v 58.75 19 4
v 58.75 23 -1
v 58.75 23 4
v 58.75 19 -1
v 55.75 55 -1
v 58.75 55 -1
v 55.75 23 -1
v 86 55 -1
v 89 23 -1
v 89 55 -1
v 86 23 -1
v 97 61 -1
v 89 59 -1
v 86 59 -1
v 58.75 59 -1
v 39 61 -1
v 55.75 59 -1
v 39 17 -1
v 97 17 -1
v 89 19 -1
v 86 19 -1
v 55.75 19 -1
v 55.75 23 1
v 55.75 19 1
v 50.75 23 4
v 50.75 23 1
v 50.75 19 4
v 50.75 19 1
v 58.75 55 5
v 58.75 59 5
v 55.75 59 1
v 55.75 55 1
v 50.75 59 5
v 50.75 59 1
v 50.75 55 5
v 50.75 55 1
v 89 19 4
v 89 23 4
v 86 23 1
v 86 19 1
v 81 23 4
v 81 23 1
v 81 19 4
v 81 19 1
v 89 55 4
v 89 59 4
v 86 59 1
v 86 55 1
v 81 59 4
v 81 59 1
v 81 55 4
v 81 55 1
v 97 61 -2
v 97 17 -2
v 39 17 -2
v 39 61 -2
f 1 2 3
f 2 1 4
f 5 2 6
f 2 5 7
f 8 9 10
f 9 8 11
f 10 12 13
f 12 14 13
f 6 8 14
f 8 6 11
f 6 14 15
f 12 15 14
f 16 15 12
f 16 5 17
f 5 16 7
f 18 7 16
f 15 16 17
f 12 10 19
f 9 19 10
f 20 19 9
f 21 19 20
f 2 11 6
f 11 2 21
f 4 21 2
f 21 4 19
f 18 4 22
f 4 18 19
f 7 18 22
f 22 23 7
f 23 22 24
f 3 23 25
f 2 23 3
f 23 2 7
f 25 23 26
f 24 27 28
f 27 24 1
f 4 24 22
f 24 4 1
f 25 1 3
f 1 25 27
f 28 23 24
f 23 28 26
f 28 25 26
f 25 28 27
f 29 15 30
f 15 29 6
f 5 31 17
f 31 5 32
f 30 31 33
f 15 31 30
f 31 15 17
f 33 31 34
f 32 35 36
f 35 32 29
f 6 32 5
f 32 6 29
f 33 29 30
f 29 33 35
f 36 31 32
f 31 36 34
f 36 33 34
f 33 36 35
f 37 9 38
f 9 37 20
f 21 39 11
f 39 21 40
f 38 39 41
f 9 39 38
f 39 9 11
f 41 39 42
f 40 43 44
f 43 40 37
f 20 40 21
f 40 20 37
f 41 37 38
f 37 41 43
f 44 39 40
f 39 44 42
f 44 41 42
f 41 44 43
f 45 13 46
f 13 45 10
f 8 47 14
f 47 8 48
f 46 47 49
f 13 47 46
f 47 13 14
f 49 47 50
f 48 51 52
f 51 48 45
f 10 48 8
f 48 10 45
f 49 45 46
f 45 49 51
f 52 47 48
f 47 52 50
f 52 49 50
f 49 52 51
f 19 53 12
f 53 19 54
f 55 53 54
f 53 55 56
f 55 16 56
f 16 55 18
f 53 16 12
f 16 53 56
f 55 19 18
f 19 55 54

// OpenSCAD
// kame outer parameters
kamebox_length=102;
kamebox_width=77;
kamebox_servobox_height=30; // was:32.
kamebox_wallstrength= 2;
kamebox_lid_height= 6;
servo_width=12;

batterydoor_width=kamebox_width-2*(kamebox_wallstrength+servo_width+8);
batterydoor_rim=3;
batterydoor_length=50;




// Blomdofts redesign to make the Kame fat.
// Battery

// Set quality
$fa = 0.5; // minimum angle
$fs = 0.5; // facet size
//---------
// Model starts here

        // battery chute
        translate([(kamebox_length-batterydoor_length)*6/8, (kamebox_width-batterydoor_width)/2-batterydoor_rim-2, -2])
        cube([batterydoor_length+8, batterydoor_width+1+batterydoor_rim*2+4, 1]);
                
        translate([(kamebox_length-batterydoor_length)*7.5/8, (kamebox_width-batterydoor_width)/2-batterydoor_rim, -1]) {
               translate([7, 0, 0]) cube([3, batterydoor_rim+1, kamebox_wallstrength+1]);       
    translate([2, 0, kamebox_wallstrength]) cube([8, batterydoor_rim+1, kamebox_wallstrength+1]);
    }
        translate([(kamebox_length-batterydoor_length)*7.5/8, (kamebox_width-batterydoor_width)/2+batterydoor_width, -1]) {
        translate([7, 0, 0]) cube([3, batterydoor_rim+1, kamebox_wallstrength+2]);
        translate([2, 0, kamebox_wallstrength]) cube([8, batterydoor_rim+1, kamebox_wallstrength+2]);
    }    
        translate([(kamebox_length-batterydoor_length)*6/8+batterydoor_length-10, (kamebox_width-batterydoor_width)/2-batterydoor_rim, -1]) {
        translate([7, 0, 0]) cube([3, batterydoor_rim+1, kamebox_wallstrength+1]);    
        translate([2, 0, kamebox_wallstrength]) cube([8, batterydoor_rim+1, kamebox_wallstrength+1]);
    }    
    translate([(kamebox_length-batterydoor_length)*6/8+batterydoor_length-10, (kamebox_width-batterydoor_width)/2+batterydoor_width, -1]) {
            translate([7, 0, 0]) cube([3, batterydoor_rim+1, kamebox_wallstrength+1]);
            translate([2, 0, kamebox_wallstrength])cube([8, batterydoor_rim+1, kamebox_wallstrength+1]);
    }
